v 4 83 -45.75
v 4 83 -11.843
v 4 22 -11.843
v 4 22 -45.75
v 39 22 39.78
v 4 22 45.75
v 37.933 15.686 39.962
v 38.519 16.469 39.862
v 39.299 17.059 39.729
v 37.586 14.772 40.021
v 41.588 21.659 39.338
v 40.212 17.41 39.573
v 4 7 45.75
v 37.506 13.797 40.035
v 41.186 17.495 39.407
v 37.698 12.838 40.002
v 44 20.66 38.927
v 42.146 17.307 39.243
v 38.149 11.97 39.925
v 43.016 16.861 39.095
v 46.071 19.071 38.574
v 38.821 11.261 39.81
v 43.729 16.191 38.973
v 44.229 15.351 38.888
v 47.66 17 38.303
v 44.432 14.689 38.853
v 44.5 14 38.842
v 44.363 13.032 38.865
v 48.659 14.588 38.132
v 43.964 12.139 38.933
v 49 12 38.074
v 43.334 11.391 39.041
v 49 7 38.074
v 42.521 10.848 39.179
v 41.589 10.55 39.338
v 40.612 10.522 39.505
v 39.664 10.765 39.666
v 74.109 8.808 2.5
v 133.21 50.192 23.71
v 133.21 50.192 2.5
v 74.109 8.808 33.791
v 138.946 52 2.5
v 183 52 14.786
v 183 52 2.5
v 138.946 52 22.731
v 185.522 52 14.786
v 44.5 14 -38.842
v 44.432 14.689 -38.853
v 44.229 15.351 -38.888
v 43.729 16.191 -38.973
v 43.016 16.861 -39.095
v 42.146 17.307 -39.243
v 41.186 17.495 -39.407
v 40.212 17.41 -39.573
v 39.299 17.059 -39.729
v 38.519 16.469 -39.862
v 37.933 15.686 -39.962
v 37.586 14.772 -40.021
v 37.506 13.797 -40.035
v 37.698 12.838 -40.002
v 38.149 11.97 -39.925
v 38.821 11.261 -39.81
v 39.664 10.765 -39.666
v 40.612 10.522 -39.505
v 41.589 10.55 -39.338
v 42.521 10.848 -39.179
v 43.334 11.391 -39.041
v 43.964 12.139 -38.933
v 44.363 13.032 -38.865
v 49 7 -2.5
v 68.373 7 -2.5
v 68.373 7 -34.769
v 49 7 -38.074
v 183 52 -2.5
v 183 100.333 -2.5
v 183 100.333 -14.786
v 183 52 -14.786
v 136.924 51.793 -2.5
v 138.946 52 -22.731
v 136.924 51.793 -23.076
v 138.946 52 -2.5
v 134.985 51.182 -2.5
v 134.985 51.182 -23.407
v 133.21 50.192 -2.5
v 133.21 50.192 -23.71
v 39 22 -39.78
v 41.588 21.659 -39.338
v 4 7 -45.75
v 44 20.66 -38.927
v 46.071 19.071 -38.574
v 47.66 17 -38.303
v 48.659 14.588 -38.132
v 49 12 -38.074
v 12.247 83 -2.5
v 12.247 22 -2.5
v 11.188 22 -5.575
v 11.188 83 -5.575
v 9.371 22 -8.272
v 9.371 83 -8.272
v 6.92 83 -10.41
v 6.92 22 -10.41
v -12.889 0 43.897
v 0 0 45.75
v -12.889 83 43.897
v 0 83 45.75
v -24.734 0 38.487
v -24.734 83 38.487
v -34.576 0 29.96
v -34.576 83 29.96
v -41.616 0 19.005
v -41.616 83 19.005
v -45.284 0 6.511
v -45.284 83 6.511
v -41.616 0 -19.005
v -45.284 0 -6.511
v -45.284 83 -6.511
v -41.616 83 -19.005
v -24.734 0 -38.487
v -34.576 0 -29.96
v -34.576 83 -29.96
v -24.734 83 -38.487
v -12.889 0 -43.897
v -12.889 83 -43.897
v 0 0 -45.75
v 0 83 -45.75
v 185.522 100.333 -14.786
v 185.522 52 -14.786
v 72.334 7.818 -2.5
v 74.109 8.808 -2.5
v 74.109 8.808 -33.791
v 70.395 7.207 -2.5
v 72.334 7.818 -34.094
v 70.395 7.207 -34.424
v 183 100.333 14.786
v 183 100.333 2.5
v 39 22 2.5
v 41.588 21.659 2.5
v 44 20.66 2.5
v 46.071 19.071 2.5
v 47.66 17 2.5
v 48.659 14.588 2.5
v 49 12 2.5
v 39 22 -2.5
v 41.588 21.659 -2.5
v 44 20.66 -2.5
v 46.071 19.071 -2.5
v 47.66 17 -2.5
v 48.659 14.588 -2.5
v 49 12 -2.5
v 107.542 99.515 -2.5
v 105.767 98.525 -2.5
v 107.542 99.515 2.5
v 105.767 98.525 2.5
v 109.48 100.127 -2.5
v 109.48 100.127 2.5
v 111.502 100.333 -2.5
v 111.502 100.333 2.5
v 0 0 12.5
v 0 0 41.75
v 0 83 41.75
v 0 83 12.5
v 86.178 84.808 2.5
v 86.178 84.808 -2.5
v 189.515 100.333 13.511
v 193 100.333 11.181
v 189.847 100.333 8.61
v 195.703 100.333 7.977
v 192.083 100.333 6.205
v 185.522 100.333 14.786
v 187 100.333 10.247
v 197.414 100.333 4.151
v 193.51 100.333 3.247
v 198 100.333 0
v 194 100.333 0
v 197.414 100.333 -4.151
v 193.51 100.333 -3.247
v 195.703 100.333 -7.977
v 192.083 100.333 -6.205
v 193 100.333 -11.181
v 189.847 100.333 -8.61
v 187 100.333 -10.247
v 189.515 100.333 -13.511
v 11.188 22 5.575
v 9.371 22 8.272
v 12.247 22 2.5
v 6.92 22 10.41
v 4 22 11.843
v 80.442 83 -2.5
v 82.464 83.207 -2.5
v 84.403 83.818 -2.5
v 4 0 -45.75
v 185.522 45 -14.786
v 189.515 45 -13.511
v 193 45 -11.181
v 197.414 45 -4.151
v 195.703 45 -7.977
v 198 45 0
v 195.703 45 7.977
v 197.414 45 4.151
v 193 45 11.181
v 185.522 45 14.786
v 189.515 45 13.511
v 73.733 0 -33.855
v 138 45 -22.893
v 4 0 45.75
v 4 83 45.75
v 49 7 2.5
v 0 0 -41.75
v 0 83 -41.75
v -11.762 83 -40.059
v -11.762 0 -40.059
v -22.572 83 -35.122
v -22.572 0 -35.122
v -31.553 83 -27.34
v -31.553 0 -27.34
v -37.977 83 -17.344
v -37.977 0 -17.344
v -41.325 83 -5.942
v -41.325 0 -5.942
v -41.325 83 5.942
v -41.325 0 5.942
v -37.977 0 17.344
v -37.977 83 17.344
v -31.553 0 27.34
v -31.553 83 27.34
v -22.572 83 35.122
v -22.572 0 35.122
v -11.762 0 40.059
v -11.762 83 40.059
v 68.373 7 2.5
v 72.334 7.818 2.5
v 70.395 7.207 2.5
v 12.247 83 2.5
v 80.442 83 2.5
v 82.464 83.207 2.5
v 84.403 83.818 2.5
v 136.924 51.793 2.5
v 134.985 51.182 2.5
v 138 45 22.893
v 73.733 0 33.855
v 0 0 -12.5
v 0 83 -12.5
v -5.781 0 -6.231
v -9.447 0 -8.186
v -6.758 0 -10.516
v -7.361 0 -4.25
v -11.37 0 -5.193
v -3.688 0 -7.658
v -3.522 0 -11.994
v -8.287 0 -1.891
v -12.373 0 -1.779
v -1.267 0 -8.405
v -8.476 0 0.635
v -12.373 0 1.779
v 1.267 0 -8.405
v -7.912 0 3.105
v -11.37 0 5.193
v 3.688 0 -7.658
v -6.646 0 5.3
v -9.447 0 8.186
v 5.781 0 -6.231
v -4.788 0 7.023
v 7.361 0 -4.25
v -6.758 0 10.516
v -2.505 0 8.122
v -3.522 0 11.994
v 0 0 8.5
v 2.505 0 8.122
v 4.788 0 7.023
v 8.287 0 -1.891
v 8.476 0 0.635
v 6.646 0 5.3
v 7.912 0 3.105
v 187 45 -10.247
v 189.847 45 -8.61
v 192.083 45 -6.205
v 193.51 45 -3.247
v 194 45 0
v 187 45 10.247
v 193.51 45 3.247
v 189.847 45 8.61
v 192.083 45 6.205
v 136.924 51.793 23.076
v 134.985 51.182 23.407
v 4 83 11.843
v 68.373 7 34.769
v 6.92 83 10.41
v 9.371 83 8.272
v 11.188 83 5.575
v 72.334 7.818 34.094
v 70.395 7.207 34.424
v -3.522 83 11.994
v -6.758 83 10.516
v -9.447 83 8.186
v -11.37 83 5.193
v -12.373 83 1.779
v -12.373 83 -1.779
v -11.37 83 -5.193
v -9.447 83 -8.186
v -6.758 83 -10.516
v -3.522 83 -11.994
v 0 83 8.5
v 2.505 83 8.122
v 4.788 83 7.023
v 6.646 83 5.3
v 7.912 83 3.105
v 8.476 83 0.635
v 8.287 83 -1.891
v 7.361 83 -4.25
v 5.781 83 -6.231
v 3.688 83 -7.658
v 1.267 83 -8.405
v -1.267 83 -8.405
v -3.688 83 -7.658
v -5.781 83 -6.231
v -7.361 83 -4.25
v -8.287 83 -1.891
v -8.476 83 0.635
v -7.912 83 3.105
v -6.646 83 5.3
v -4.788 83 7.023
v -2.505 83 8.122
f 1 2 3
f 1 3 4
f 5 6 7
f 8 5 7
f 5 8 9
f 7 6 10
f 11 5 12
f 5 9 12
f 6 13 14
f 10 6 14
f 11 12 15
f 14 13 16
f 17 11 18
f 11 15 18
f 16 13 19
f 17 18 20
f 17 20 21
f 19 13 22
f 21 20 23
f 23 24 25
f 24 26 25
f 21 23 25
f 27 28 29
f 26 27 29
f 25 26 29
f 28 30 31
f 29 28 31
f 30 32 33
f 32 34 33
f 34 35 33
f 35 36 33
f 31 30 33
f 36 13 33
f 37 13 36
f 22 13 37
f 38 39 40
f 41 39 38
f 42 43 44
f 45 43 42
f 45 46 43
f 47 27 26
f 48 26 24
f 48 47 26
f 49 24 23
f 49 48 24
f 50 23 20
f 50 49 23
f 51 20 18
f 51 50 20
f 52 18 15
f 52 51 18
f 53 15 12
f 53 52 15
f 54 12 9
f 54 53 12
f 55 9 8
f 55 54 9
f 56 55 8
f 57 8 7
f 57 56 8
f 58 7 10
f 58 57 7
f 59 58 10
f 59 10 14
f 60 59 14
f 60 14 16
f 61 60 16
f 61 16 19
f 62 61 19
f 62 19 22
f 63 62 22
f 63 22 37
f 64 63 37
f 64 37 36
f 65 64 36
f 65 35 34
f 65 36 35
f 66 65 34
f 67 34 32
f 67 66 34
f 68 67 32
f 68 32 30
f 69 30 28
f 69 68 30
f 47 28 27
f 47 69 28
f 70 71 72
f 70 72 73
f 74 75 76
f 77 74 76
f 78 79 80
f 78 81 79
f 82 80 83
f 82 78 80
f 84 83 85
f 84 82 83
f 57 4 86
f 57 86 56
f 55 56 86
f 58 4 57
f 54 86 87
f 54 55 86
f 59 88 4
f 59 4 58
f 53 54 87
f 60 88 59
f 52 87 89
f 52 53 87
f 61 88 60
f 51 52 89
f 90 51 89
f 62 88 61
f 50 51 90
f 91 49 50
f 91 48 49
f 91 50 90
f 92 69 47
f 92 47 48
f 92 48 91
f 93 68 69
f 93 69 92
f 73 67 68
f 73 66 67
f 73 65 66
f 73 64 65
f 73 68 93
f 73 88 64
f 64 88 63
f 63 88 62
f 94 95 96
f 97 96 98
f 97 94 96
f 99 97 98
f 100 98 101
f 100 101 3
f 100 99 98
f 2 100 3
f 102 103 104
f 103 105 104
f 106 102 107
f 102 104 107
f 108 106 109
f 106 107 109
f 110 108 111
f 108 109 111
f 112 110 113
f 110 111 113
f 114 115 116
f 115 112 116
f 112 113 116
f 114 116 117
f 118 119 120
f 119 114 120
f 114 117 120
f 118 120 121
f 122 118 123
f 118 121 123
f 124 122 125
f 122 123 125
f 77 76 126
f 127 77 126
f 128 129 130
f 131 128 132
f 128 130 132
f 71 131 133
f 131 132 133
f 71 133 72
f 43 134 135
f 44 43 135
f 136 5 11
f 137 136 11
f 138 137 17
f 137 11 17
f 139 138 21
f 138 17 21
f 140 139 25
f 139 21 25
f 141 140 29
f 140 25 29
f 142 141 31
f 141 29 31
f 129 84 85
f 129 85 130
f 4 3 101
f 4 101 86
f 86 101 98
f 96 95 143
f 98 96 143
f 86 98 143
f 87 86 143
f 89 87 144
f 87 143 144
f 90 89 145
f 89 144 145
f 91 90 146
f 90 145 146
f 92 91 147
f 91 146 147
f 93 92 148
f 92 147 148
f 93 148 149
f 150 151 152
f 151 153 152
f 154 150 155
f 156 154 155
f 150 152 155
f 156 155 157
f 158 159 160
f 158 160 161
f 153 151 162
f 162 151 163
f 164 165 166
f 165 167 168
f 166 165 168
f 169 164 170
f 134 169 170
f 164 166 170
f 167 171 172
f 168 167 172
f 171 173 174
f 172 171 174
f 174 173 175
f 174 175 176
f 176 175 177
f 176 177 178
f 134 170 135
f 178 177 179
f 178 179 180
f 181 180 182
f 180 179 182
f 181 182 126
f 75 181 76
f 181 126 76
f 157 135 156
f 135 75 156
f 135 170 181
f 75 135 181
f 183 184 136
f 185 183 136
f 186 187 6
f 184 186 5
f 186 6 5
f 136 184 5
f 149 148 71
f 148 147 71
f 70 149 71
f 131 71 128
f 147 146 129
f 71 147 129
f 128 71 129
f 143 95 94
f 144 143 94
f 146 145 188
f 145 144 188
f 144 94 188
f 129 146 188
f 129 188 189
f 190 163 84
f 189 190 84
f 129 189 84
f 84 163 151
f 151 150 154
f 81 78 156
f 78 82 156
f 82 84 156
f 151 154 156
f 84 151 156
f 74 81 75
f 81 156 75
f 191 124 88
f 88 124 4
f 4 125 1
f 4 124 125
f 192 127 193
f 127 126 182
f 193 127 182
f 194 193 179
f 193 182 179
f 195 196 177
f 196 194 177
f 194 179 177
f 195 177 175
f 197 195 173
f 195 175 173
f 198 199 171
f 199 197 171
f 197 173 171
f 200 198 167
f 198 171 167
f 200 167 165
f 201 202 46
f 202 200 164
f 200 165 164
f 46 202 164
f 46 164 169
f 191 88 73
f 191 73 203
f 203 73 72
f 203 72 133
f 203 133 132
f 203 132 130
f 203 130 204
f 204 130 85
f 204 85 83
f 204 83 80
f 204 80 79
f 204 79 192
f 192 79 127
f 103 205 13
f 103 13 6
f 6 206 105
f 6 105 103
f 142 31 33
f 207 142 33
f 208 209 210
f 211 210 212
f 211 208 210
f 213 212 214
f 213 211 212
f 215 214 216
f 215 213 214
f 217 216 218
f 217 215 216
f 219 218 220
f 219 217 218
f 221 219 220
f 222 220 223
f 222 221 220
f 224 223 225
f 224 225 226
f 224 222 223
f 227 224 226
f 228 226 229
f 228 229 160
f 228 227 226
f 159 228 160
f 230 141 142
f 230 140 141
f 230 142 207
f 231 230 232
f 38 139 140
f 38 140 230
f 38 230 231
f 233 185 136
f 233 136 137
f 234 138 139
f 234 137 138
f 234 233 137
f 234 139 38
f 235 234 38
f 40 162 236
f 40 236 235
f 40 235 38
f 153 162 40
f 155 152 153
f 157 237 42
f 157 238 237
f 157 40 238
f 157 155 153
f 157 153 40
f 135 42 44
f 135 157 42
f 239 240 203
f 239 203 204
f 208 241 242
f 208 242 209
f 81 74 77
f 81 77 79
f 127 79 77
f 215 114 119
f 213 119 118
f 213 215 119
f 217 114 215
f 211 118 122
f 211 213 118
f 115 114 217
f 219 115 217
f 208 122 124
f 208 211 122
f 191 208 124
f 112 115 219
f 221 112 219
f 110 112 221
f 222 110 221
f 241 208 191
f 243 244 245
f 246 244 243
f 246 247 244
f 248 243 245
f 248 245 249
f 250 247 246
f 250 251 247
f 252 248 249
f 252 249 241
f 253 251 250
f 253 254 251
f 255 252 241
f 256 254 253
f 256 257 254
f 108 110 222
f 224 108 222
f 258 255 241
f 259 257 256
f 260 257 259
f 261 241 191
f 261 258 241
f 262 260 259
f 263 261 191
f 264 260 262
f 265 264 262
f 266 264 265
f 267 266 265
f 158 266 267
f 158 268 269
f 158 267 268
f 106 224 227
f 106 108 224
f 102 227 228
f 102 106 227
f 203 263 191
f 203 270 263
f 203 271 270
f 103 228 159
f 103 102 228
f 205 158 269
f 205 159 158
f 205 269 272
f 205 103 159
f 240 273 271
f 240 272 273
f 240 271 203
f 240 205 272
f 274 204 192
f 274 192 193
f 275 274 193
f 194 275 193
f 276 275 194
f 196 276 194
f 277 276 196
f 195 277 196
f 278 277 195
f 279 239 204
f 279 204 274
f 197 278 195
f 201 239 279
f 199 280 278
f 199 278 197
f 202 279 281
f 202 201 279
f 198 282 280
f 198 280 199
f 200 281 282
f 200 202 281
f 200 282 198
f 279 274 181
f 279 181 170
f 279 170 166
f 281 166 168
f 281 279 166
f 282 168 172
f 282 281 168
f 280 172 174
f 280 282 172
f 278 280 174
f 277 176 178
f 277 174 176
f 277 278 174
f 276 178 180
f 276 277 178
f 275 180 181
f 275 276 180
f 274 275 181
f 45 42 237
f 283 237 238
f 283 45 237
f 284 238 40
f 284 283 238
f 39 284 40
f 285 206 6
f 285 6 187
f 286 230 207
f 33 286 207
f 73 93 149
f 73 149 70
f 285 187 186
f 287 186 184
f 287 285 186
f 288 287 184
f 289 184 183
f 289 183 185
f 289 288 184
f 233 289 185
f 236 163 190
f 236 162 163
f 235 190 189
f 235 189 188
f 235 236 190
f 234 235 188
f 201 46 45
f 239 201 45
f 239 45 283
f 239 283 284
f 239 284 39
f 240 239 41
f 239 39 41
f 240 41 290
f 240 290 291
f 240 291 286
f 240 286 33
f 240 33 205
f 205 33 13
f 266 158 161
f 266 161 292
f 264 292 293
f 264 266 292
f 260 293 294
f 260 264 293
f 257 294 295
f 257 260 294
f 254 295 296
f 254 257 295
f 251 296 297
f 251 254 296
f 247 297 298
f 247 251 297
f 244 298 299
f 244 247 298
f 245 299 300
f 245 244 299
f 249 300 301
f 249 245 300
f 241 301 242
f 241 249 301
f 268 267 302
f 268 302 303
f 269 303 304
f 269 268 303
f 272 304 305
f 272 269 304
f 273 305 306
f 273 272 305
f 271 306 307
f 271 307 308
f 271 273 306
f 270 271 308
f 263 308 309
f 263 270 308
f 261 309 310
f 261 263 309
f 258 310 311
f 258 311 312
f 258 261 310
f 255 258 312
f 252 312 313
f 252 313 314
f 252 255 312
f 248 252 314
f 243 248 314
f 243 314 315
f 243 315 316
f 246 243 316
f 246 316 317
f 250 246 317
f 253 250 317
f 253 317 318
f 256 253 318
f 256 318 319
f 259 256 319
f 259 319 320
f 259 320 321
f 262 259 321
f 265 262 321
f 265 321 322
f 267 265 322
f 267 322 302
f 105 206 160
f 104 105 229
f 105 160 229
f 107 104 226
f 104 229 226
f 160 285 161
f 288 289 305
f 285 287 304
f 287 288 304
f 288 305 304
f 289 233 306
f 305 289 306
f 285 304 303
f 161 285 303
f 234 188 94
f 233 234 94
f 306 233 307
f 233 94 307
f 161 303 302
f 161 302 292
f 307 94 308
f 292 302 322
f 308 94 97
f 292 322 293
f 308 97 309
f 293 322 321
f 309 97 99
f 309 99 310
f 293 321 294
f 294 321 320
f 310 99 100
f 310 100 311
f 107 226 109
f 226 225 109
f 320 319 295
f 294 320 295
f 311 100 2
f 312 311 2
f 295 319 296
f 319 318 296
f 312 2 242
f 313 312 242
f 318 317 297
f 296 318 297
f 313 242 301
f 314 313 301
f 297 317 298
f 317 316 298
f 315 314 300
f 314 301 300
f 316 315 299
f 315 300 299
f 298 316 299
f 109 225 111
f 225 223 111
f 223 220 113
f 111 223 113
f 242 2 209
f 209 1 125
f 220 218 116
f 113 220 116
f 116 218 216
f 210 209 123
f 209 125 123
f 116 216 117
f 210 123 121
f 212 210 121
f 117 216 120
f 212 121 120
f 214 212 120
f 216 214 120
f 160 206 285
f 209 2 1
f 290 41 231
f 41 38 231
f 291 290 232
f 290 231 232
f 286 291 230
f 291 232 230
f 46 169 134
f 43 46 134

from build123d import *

# Parameters (mm, degrees)
BOSS_EXTRUDE1_DEPTH     = 200
BOSS_EXTRUDE2_DEPTH     = 200
BOSS_EXTRUDE3_START     = 76
SKETCH4_R               = 8.5
BOSS_EXTRUDE3_DEPTH     = 83
BOSS_EXTRUDE4_START     = 48.333333333
BOSS_EXTRUDE4_DEPTH     = 55.333333333
RIB1_START              = -2.5
RIB1_DEPTH              = 5
FILLET3_R               = 10
SKETCH9_R               = 3.5
BOSS_EXTRUDE6_DEPTH     = 50
CUT_EXTRUDE3_DEPTH      = 244.455905202
CUT_EXTRUDE3_DEPTH_BACK = 244.455905202
SKETCH10_R              = 3.5
CUT_EXTRUDE4_DEPTH      = 219.723823831
CUT_EXTRUDE4_DEPTH_BACK = 219.723823831
CUT_EXTRUDE2_DEPTH      = 220.51323992
CUT_EXTRUDE2_DEPTH_BACK = 220.51323992
SKETCH7_R               = 8.5


# Read off the part's stored shape, not the designer's step: Rib1
with BuildPart() as part:
    # Sketch1 → Boss-Extrude1 (new, symmetric)
    with BuildSketch(Plane(origin=(0, 0, 0), x_dir=(1, 0, 0), z_dir=(0, 1, 0))):
        with BuildLine():
            Line((0, 45.75), (4, 45.75))
            Line((4, 45.75), (185.522228719, 14.786424933))
            ThreePointArc((185.522228719, 14.786424933), (198, 0), (185.522228719, -14.786424933))
            Line((185.522228719, -14.786424933), (4, -45.75))
            Line((4, -45.75), (0, -45.75))
            ThreePointArc((0, -45.75), (-45.75, 0), (0, 45.75))
        make_face()
    extrude(amount=BOSS_EXTRUDE1_DEPTH, both=True)


with BuildPart() as body_2:
    # Sketch3 → Boss-Extrude2 (new, symmetric)
    with BuildSketch(Plane.XY):
        Polygon((-45.75, 0), (73.733339697, 0), (138, 45), (198, 45), (198, 52), (135.792908478, 52), (71.526248174, 7), (-45.75, 7), align=None)
    extrude(amount=BOSS_EXTRUDE2_DEPTH, both=True)


with BuildPart() as part_1:
    add(part.part)

    # Combine1: intersect body 2
    add(body_2.part, mode=Mode.INTERSECT)

    # Sketch4 → Boss-Extrude3 (add)
    with BuildSketch(Plane(origin=(0, 7, 0), x_dir=(1, 0, 0), z_dir=(0, 1, 0)).offset(BOSS_EXTRUDE3_START)):
        with BuildLine():
            Line((0, -45.75), (4, -45.75))
            Line((4, -45.75), (4, -11.842719282))
            ThreePointArc((4, -11.842719282), (12.5, 0), (4, 11.842719282))
            Line((4, 11.842719282), (4, 45.75))
            Line((4, 45.75), (0, 45.75))
            ThreePointArc((0, 45.75), (-45.75, 0), (0, -45.75))
        make_face()
        with Locations(Location((0, 0, 0), (0, 0, 270))):
            Circle(SKETCH4_R, mode=Mode.SUBTRACT)
        with BuildLine():
            Line((0, -41.75), (0, -12.5))
            ThreePointArc((0, -12.5), (-12.5, 0), (0, 12.5))
            Line((0, 12.5), (0, 41.75))
            ThreePointArc((0, 41.75), (-41.75, 0), (0, -41.75))
        make_face(mode=Mode.SUBTRACT)
    extrude(amount=-BOSS_EXTRUDE3_DEPTH)

    # Sketch5 → Boss-Extrude4 (add)
    with BuildSketch(Plane(origin=(0, 52, 0), x_dir=(1, 0, 0), z_dir=(0, 1, 0)).offset(BOSS_EXTRUDE4_START)):
        with BuildLine():
            Line((185.522228719, -14.786424933), (183, -14.786424933))
            Line((183, -14.786424933), (183, 14.786424933))
            Line((183, 14.786424933), (185.522228719, 14.786424933))
            ThreePointArc((185.522228719, 14.786424933), (198, 0), (185.522228719, -14.786424933))
        make_face()
        with BuildLine():
            Line((187, -10.246950766), (187, 10.246950766))
            ThreePointArc((187, 10.246950766), (194, 0), (187, -10.246950766))
        make_face(mode=Mode.SUBTRACT)
    extrude(amount=-BOSS_EXTRUDE4_DEPTH)

    # Rib1 outline → Rib1 (add)
    with BuildSketch(Plane.XY.offset(RIB1_START)):
        Polygon((108.349339446, 100.333333333), (83.594773996, 83), (11, 83), (11, 7), (71.526248174, 7), (135.792908478, 52), (183, 52), (183, 100.333333333), align=None)
    extrude(amount=RIB1_DEPTH)

    # Fillet3
    fillet3_edges = [part_1.edges().sort_by_distance(p)[0] for p in [
        (135.792908478, 52, -12.884559521),
        (71.526248174, 7, -18.365776821),
        (108.349339446, 100.333333333, 0),
        (83.594773996, 83, 0),
        (135.792908478, 52, 12.884559521),
        (71.526248174, 7, 18.365776821),
    ]]
    fillet(fillet3_edges, radius=FILLET3_R)

    # Sketch9 → Boss-Extrude6 (add, symmetric)
    with BuildSketch(Plane.XY):
        with BuildLine():
            Line((4, 7), (4, 22))
            Line((4, 22), (39, 22))
            ThreePointArc((39, 22), (46.071067812, 19.071067812), (49, 12))
            Line((49, 12), (49, 7))
            Line((49, 7), (4, 7))
        make_face()
        with Locations((41, 14)):
            Circle(SKETCH9_R, mode=Mode.SUBTRACT)
    extrude(amount=BOSS_EXTRUDE6_DEPTH, both=True)

    # Sketch10 → Cut-Extrude3 (cut, two sides: drawn at the far end of the back side and taken through both)
    with BuildSketch(Plane.XY.offset(50).offset(-CUT_EXTRUDE3_DEPTH_BACK)):
        with Locations((41, 14)):
            Circle(SKETCH10_R)
    extrude(amount=CUT_EXTRUDE3_DEPTH + CUT_EXTRUDE3_DEPTH_BACK, mode=Mode.SUBTRACT)

    # Sketch11 → Cut-Extrude4 (cut, two sides: drawn at the far end of the back side and taken through both)
    with BuildSketch(Plane(origin=(0, 22, 0), x_dir=(1, 0, 0), z_dir=(0, 1, 0)).offset(-CUT_EXTRUDE4_DEPTH_BACK)):
        Polygon((4, -45.75), (49, -38.074020657), (49, -50), (4, -50), align=None)
        Polygon((4, 45.75), (49, 38.074020657), (49, 50), (4, 50), align=None)
    extrude(amount=CUT_EXTRUDE4_DEPTH + CUT_EXTRUDE4_DEPTH_BACK, mode=Mode.SUBTRACT)

    # Sketch7 → Cut-Extrude2 (cut, two sides: drawn at the far end of the back side and taken through both)
    with BuildSketch(Plane(origin=(0, 83, 0), x_dir=(1, 0, 0), z_dir=(0, 1, 0)).offset(-CUT_EXTRUDE2_DEPTH_BACK)):
        with Locations(Location((0, 0, 0), (0, 0, 270))):
            Circle(SKETCH7_R)
        with BuildLine():
            Line((187, 10.246950766), (187, -10.246950766))
            ThreePointArc((187, -10.246950766), (194, 0), (187, 10.246950766))
        make_face()
        with BuildLine():
            Line((0, 12.5), (0, 41.75))
            ThreePointArc((0, 41.75), (-41.75, 0), (0, -41.75))
            Line((0, -41.75), (0, -12.5))
            ThreePointArc((0, -12.5), (-12.5, 0), (0, 12.5))
        make_face()
    extrude(amount=CUT_EXTRUDE2_DEPTH + CUT_EXTRUDE2_DEPTH_BACK, mode=Mode.SUBTRACT)


solid = part_1.part
